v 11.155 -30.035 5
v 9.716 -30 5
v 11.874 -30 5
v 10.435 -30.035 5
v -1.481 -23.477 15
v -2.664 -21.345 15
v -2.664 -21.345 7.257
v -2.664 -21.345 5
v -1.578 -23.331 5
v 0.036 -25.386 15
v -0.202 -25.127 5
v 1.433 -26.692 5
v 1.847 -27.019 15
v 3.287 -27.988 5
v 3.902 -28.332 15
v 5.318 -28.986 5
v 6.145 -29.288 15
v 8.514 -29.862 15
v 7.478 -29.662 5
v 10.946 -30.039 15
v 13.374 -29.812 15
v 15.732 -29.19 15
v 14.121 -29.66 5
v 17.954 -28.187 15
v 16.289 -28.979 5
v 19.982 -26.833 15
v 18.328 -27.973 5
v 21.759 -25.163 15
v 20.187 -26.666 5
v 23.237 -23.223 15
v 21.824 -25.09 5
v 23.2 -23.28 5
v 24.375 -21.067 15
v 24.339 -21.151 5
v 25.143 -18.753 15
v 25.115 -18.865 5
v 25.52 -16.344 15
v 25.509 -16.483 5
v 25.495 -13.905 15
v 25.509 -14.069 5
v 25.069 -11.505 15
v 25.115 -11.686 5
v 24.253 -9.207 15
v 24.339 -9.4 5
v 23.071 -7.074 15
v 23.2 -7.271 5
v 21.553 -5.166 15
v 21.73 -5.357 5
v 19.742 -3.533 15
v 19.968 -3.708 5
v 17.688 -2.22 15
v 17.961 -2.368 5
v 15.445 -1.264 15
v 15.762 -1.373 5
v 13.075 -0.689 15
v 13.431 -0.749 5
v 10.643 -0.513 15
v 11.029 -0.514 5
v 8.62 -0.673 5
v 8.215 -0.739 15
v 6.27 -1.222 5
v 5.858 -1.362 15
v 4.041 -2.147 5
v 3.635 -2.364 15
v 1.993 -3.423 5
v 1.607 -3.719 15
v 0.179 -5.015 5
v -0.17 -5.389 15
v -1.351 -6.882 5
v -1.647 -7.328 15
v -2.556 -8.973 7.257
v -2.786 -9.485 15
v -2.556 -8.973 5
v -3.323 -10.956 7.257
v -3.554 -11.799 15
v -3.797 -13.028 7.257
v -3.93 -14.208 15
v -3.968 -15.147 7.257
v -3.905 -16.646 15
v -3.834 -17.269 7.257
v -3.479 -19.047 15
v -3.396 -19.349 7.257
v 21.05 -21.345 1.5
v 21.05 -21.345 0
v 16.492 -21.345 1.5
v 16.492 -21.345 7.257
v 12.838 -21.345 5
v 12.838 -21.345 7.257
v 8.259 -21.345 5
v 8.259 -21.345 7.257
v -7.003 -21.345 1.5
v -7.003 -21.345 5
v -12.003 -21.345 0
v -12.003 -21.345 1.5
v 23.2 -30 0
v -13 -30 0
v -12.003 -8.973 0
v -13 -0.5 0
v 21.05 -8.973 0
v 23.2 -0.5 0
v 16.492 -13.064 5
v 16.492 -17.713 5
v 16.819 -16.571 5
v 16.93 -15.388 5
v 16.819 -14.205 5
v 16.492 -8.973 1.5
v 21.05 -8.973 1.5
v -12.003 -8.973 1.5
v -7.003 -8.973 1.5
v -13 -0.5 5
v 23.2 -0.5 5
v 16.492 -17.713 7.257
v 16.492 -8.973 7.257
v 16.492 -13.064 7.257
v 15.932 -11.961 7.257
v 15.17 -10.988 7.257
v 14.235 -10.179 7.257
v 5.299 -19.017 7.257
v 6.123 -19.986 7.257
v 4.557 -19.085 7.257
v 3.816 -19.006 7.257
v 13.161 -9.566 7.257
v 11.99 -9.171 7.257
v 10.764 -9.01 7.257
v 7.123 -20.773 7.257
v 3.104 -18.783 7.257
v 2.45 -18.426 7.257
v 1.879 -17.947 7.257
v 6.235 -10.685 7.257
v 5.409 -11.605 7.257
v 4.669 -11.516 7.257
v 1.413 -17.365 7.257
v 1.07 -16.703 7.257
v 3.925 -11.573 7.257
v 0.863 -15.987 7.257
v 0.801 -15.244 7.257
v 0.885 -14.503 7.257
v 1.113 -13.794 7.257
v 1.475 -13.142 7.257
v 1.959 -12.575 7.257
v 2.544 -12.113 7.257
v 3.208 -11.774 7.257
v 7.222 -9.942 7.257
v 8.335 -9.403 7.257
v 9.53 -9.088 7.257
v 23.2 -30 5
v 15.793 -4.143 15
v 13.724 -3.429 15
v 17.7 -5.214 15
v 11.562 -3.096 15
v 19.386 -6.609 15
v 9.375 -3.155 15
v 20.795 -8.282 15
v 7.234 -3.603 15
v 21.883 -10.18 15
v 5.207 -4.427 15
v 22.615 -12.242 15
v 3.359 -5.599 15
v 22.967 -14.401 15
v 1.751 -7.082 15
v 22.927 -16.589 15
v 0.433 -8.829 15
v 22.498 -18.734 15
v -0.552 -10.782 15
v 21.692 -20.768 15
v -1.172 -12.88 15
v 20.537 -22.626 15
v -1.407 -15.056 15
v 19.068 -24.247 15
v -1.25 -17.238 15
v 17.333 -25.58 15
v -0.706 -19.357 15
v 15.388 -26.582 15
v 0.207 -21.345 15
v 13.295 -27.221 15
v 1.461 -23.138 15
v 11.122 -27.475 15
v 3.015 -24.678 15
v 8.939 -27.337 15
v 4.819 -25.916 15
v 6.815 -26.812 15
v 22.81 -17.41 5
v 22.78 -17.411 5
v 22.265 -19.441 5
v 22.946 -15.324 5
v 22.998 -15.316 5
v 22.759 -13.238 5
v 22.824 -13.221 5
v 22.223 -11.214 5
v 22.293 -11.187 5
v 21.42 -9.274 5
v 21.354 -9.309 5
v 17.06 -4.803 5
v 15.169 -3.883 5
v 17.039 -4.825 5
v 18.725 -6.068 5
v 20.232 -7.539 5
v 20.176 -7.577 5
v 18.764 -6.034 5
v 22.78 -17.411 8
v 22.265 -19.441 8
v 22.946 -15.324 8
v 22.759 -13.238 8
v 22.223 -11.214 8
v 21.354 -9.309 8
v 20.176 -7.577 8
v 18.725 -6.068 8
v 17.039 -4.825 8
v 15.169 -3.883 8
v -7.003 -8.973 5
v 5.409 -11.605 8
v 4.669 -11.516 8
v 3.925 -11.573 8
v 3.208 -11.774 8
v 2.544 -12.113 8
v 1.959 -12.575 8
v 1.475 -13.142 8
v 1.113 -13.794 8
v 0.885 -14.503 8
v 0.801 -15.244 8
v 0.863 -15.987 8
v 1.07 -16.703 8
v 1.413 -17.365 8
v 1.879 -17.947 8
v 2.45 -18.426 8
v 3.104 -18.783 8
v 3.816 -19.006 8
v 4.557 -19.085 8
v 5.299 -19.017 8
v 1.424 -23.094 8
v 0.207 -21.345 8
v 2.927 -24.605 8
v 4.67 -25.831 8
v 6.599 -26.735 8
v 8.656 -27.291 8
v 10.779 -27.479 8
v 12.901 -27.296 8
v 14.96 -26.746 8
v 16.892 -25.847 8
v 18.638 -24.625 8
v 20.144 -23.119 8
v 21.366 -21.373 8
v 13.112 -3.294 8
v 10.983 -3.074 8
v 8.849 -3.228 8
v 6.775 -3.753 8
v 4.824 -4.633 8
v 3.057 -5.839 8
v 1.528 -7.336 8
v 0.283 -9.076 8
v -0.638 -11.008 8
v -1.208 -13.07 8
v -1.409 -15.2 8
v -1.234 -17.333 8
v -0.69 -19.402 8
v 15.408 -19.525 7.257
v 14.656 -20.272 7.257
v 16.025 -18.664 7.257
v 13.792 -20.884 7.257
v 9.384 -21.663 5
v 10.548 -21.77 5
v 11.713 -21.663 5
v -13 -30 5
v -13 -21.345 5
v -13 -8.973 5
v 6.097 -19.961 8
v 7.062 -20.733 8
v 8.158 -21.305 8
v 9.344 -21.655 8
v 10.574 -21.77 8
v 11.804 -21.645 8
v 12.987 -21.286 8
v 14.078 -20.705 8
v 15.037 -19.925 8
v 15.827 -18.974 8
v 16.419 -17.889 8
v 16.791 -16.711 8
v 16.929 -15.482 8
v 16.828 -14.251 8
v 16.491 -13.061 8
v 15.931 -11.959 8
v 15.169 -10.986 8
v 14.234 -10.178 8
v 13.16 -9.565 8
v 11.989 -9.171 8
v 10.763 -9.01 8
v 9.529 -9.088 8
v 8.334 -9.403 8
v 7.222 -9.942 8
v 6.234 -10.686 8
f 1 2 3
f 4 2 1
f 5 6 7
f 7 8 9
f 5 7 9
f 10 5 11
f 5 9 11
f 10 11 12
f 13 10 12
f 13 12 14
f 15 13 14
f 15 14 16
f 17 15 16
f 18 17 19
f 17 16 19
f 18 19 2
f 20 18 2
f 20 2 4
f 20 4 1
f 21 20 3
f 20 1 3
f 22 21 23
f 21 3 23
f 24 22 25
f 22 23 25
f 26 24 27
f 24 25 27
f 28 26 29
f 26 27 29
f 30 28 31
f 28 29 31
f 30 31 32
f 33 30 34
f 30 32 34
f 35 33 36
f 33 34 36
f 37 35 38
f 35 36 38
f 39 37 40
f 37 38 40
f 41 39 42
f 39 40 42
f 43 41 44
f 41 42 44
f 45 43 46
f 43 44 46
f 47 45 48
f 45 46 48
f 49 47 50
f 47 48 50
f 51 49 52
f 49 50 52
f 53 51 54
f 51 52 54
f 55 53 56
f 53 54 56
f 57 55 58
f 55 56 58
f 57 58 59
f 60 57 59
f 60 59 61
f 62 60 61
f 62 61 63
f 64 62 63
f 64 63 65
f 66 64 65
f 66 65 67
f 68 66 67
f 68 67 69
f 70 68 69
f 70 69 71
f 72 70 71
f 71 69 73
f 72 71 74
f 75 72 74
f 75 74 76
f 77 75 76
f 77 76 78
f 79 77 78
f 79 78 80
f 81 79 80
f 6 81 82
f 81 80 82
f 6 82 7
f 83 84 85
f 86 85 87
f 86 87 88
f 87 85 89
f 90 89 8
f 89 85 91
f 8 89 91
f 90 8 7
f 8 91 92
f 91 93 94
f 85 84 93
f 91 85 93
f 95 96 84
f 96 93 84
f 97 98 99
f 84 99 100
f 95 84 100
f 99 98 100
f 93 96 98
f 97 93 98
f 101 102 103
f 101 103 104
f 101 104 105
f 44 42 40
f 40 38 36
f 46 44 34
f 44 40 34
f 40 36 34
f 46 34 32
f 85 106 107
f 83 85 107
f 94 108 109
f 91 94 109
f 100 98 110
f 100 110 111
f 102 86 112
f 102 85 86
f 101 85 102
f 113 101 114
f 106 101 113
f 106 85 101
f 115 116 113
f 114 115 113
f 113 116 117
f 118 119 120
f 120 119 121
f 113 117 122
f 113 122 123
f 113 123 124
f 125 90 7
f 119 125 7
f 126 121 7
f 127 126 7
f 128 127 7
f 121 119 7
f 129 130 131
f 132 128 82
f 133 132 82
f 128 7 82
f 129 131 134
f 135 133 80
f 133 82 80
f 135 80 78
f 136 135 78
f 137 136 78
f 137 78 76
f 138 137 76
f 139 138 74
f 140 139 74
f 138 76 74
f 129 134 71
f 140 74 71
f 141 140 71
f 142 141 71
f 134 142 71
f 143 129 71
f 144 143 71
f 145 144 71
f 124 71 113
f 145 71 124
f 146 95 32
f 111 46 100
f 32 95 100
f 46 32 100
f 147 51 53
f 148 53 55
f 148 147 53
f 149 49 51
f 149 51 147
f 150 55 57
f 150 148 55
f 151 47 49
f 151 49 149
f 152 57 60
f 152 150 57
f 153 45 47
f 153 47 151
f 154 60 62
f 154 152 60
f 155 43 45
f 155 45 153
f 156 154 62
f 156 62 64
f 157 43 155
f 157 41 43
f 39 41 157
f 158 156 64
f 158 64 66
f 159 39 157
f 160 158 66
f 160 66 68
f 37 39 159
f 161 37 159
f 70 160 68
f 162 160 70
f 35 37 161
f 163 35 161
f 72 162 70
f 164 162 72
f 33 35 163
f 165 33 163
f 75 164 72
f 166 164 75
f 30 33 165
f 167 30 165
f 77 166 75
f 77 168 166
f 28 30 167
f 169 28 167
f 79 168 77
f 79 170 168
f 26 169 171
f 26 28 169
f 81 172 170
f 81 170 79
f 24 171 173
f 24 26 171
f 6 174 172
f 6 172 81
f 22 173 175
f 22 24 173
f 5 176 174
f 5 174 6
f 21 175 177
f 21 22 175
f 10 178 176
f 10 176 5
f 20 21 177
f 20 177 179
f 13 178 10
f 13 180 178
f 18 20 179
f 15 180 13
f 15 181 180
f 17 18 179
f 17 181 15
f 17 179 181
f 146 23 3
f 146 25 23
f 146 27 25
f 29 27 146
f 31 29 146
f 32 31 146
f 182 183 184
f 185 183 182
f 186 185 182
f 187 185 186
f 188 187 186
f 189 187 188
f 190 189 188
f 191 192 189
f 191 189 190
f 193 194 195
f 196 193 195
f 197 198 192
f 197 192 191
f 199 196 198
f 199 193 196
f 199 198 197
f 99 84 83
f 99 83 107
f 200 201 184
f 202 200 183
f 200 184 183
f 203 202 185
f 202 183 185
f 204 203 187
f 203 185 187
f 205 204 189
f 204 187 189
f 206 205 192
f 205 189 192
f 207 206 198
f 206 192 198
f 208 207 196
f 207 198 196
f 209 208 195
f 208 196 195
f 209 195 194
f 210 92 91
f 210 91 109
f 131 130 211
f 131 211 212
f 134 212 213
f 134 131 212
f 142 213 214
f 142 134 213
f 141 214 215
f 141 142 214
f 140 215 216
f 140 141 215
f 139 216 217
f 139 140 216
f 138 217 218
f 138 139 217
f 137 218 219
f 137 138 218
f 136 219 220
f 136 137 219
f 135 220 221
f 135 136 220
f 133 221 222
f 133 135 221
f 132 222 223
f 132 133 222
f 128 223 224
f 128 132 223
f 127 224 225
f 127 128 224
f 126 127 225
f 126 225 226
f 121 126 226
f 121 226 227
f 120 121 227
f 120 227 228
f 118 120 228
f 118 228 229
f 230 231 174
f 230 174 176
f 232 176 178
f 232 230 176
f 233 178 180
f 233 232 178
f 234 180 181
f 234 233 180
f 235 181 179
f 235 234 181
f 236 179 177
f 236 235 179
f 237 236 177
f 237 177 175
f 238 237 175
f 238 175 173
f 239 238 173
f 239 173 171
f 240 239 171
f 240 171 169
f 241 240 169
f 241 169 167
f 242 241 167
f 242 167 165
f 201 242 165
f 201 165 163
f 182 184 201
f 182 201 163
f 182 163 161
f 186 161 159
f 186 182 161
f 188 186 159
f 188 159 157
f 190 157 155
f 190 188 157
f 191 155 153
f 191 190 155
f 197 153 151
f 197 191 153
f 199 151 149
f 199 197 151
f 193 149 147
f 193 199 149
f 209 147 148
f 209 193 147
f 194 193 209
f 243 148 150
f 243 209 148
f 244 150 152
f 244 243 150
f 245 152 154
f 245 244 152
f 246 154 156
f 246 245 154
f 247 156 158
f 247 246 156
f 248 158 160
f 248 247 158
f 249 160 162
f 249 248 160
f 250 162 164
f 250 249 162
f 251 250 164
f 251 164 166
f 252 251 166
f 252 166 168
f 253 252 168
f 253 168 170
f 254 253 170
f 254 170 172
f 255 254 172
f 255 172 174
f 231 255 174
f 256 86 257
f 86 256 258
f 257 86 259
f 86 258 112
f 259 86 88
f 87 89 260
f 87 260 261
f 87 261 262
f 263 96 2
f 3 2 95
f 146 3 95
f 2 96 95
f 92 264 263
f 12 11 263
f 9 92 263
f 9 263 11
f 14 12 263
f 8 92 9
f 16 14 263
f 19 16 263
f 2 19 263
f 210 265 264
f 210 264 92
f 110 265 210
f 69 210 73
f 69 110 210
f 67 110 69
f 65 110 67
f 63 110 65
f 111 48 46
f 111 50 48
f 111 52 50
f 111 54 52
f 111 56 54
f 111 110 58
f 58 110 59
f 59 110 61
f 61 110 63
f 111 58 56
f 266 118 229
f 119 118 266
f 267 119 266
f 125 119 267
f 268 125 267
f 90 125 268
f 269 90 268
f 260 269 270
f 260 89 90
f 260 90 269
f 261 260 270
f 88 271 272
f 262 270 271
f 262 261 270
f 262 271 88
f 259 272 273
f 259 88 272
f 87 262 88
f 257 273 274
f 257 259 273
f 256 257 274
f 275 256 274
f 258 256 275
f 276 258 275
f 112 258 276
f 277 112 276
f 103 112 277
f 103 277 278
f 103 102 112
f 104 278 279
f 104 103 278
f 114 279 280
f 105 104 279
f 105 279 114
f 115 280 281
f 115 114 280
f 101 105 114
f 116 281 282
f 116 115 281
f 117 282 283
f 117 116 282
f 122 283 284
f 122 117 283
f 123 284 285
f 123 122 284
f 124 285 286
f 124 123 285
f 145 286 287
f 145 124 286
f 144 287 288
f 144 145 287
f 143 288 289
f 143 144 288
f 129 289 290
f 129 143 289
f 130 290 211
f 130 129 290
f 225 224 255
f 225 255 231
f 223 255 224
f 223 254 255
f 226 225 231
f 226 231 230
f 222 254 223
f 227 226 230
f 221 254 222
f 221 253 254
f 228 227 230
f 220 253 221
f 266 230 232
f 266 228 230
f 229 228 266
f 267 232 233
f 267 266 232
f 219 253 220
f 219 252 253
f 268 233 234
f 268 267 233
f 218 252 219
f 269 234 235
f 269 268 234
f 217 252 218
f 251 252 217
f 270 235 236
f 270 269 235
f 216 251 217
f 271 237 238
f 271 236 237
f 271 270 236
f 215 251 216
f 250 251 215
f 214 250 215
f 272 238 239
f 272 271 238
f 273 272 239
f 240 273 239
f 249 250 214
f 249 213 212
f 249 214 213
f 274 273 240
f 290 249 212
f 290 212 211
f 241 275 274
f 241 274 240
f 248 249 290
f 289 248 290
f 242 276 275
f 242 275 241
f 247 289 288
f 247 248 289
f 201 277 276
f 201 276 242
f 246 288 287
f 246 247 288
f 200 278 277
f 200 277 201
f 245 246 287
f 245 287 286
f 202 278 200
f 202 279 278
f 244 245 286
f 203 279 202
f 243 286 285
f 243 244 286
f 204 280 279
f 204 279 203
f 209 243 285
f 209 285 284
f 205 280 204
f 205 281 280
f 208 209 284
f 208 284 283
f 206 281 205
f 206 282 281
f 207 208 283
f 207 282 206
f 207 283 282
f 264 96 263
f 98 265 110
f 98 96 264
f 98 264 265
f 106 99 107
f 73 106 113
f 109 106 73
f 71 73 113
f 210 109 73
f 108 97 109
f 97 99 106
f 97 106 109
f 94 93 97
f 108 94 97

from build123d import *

# Parameters (mm, degrees)
ESQUISSE1_W             = 36.200001836
ESQUISSE1_H             = 29.499999305
BOSS_EXTRU_1_DEPTH      = 5
ESQUISSE2_W             = 33.052998595
ESQUISSE2_H             = 12.371999211
ENL_V_MAT_EXTRU_1_DEPTH = 5
BOSS_EXTRU_2_START      = 5
ESQUISSE3_W             = 4.558359629
ESQUISSE3_H             = 12.371999211
ESQUISSE3_W_2           = 4.999999888
ESQUISSE3_H_2           = 12.380001135
BOSS_EXTRU_2_DEPTH      = 3.5
BOSS_EXTRU_7_START      = 5
ESQUISSE5_R             = 14.763664953
ESQUISSE5_R_2           = 12.203597673
BOSS_EXTRU_7_DEPTH      = 10
BOSS_EXTRU_5_DEPTH      = 2
BOSS_EXTRU_5_DEPTH_BACK = 1
BOSS_EXTRU_5_START      = 6
ESQUISSE4_R             = 12.398139185
ENL_V_MAT_EXTRU_3_REACH = 53.128
ESQUISSE6_W             = 2.256513492
ESQUISSE6_H             = 12.371999211


with BuildPart() as part:
    # Esquisse1 → Boss.-Extru.1 (new body)
    with BuildSketch(Plane.XY):
        with Locations((5.10000065, -15.249999676)):
            Rectangle(ESQUISSE1_W, ESQUISSE1_H)
    extrude(amount=BOSS_EXTRU_1_DEPTH)

    # Esquisse2 → Enlèv. mat.-Extru.1 (cut)
    with BuildSketch(Plane.XY):
        with Locations((4.523499403, -15.158999246)):
            Rectangle(ESQUISSE2_W, ESQUISSE2_H)
    extrude(amount=ENL_V_MAT_EXTRU_1_DEPTH, mode=Mode.SUBTRACT)

    # Esquisse3 → Boss.-Extru.2 (add)
    with BuildSketch(Plane.XY.offset(BOSS_EXTRU_2_START)):
        with Locations((18.770818887, -15.158999246)):
            Rectangle(ESQUISSE3_W, ESQUISSE3_H)
        with Locations((-9.50299995, -15.163000208)):
            Rectangle(ESQUISSE3_W_2, ESQUISSE3_H_2)
    extrude(amount=-BOSS_EXTRU_2_DEPTH)

    # Esquisse5 → Boss.-Extru.7 (add)
    with BuildSketch(Plane.XY.offset(BOSS_EXTRU_7_START)):
        with Locations(Location((10.794645366, -15.275821527, 0), (0, 0, 204.273249948))):
            Circle(ESQUISSE5_R)
        with Locations(Location((10.794645366, -15.275821527, 0), (0, 0, 209.823305738))):
            Circle(ESQUISSE5_R_2, mode=Mode.SUBTRACT)
    extrude(amount=BOSS_EXTRU_7_DEPTH)

    # Esquisse4 → Boss.-Extru.5 (add, two sides: drawn at the far end of the back side and taken through both)
    with BuildSketch(Plane.XY.offset(BOSS_EXTRU_5_START - BOSS_EXTRU_5_DEPTH_BACK)):
        with Locations((10.5484362, -15.38812394)):
            Circle(ESQUISSE4_R)
        with BuildLine():
            ThreePointArc((5.299216058, -19.01722353), (16.929328279, -15.482422447), (5.408748548, -11.605494329))
            ThreePointArc((5.408748548, -11.605494329), (0.800592824, -15.244067738), (5.299216058, -19.01722353))
        make_face(mode=Mode.SUBTRACT)
    extrude(amount=BOSS_EXTRU_5_DEPTH + BOSS_EXTRU_5_DEPTH_BACK)

    # Enlèv. mat.-Extru.3: up to this face of the body (flat: up to its plane)
    enl_v_mat_extru_3_end = Plane(part.part.faces().sort_by_distance((16.491639072, -15.158999246, 3.25))[0])
    # Esquisse6 → Enlèv. mat.-Extru.3 (cut, up to the picked face)
    with BuildSketch(Plane.ZY.offset(13.000000268), mode=Mode.PRIVATE) as enl_v_mat_extru_3_sk1:
        with Locations((6.128256634, -15.158999246)):
            Rectangle(ESQUISSE6_W, ESQUISSE6_H)
    enl_v_mat_extru_3_tool1 = split(extrude(enl_v_mat_extru_3_sk1.sketch, amount=-ENL_V_MAT_EXTRU_3_REACH, mode=Mode.PRIVATE), bisect_by=enl_v_mat_extru_3_end, keep=Keep.BOTH, mode=Mode.PRIVATE)
    add(enl_v_mat_extru_3_tool1.solids().sort_by(Axis((-13, -15.158999, 6.128257), (1, 0, 0)))[0], mode=Mode.SUBTRACT)


solid = part.part
